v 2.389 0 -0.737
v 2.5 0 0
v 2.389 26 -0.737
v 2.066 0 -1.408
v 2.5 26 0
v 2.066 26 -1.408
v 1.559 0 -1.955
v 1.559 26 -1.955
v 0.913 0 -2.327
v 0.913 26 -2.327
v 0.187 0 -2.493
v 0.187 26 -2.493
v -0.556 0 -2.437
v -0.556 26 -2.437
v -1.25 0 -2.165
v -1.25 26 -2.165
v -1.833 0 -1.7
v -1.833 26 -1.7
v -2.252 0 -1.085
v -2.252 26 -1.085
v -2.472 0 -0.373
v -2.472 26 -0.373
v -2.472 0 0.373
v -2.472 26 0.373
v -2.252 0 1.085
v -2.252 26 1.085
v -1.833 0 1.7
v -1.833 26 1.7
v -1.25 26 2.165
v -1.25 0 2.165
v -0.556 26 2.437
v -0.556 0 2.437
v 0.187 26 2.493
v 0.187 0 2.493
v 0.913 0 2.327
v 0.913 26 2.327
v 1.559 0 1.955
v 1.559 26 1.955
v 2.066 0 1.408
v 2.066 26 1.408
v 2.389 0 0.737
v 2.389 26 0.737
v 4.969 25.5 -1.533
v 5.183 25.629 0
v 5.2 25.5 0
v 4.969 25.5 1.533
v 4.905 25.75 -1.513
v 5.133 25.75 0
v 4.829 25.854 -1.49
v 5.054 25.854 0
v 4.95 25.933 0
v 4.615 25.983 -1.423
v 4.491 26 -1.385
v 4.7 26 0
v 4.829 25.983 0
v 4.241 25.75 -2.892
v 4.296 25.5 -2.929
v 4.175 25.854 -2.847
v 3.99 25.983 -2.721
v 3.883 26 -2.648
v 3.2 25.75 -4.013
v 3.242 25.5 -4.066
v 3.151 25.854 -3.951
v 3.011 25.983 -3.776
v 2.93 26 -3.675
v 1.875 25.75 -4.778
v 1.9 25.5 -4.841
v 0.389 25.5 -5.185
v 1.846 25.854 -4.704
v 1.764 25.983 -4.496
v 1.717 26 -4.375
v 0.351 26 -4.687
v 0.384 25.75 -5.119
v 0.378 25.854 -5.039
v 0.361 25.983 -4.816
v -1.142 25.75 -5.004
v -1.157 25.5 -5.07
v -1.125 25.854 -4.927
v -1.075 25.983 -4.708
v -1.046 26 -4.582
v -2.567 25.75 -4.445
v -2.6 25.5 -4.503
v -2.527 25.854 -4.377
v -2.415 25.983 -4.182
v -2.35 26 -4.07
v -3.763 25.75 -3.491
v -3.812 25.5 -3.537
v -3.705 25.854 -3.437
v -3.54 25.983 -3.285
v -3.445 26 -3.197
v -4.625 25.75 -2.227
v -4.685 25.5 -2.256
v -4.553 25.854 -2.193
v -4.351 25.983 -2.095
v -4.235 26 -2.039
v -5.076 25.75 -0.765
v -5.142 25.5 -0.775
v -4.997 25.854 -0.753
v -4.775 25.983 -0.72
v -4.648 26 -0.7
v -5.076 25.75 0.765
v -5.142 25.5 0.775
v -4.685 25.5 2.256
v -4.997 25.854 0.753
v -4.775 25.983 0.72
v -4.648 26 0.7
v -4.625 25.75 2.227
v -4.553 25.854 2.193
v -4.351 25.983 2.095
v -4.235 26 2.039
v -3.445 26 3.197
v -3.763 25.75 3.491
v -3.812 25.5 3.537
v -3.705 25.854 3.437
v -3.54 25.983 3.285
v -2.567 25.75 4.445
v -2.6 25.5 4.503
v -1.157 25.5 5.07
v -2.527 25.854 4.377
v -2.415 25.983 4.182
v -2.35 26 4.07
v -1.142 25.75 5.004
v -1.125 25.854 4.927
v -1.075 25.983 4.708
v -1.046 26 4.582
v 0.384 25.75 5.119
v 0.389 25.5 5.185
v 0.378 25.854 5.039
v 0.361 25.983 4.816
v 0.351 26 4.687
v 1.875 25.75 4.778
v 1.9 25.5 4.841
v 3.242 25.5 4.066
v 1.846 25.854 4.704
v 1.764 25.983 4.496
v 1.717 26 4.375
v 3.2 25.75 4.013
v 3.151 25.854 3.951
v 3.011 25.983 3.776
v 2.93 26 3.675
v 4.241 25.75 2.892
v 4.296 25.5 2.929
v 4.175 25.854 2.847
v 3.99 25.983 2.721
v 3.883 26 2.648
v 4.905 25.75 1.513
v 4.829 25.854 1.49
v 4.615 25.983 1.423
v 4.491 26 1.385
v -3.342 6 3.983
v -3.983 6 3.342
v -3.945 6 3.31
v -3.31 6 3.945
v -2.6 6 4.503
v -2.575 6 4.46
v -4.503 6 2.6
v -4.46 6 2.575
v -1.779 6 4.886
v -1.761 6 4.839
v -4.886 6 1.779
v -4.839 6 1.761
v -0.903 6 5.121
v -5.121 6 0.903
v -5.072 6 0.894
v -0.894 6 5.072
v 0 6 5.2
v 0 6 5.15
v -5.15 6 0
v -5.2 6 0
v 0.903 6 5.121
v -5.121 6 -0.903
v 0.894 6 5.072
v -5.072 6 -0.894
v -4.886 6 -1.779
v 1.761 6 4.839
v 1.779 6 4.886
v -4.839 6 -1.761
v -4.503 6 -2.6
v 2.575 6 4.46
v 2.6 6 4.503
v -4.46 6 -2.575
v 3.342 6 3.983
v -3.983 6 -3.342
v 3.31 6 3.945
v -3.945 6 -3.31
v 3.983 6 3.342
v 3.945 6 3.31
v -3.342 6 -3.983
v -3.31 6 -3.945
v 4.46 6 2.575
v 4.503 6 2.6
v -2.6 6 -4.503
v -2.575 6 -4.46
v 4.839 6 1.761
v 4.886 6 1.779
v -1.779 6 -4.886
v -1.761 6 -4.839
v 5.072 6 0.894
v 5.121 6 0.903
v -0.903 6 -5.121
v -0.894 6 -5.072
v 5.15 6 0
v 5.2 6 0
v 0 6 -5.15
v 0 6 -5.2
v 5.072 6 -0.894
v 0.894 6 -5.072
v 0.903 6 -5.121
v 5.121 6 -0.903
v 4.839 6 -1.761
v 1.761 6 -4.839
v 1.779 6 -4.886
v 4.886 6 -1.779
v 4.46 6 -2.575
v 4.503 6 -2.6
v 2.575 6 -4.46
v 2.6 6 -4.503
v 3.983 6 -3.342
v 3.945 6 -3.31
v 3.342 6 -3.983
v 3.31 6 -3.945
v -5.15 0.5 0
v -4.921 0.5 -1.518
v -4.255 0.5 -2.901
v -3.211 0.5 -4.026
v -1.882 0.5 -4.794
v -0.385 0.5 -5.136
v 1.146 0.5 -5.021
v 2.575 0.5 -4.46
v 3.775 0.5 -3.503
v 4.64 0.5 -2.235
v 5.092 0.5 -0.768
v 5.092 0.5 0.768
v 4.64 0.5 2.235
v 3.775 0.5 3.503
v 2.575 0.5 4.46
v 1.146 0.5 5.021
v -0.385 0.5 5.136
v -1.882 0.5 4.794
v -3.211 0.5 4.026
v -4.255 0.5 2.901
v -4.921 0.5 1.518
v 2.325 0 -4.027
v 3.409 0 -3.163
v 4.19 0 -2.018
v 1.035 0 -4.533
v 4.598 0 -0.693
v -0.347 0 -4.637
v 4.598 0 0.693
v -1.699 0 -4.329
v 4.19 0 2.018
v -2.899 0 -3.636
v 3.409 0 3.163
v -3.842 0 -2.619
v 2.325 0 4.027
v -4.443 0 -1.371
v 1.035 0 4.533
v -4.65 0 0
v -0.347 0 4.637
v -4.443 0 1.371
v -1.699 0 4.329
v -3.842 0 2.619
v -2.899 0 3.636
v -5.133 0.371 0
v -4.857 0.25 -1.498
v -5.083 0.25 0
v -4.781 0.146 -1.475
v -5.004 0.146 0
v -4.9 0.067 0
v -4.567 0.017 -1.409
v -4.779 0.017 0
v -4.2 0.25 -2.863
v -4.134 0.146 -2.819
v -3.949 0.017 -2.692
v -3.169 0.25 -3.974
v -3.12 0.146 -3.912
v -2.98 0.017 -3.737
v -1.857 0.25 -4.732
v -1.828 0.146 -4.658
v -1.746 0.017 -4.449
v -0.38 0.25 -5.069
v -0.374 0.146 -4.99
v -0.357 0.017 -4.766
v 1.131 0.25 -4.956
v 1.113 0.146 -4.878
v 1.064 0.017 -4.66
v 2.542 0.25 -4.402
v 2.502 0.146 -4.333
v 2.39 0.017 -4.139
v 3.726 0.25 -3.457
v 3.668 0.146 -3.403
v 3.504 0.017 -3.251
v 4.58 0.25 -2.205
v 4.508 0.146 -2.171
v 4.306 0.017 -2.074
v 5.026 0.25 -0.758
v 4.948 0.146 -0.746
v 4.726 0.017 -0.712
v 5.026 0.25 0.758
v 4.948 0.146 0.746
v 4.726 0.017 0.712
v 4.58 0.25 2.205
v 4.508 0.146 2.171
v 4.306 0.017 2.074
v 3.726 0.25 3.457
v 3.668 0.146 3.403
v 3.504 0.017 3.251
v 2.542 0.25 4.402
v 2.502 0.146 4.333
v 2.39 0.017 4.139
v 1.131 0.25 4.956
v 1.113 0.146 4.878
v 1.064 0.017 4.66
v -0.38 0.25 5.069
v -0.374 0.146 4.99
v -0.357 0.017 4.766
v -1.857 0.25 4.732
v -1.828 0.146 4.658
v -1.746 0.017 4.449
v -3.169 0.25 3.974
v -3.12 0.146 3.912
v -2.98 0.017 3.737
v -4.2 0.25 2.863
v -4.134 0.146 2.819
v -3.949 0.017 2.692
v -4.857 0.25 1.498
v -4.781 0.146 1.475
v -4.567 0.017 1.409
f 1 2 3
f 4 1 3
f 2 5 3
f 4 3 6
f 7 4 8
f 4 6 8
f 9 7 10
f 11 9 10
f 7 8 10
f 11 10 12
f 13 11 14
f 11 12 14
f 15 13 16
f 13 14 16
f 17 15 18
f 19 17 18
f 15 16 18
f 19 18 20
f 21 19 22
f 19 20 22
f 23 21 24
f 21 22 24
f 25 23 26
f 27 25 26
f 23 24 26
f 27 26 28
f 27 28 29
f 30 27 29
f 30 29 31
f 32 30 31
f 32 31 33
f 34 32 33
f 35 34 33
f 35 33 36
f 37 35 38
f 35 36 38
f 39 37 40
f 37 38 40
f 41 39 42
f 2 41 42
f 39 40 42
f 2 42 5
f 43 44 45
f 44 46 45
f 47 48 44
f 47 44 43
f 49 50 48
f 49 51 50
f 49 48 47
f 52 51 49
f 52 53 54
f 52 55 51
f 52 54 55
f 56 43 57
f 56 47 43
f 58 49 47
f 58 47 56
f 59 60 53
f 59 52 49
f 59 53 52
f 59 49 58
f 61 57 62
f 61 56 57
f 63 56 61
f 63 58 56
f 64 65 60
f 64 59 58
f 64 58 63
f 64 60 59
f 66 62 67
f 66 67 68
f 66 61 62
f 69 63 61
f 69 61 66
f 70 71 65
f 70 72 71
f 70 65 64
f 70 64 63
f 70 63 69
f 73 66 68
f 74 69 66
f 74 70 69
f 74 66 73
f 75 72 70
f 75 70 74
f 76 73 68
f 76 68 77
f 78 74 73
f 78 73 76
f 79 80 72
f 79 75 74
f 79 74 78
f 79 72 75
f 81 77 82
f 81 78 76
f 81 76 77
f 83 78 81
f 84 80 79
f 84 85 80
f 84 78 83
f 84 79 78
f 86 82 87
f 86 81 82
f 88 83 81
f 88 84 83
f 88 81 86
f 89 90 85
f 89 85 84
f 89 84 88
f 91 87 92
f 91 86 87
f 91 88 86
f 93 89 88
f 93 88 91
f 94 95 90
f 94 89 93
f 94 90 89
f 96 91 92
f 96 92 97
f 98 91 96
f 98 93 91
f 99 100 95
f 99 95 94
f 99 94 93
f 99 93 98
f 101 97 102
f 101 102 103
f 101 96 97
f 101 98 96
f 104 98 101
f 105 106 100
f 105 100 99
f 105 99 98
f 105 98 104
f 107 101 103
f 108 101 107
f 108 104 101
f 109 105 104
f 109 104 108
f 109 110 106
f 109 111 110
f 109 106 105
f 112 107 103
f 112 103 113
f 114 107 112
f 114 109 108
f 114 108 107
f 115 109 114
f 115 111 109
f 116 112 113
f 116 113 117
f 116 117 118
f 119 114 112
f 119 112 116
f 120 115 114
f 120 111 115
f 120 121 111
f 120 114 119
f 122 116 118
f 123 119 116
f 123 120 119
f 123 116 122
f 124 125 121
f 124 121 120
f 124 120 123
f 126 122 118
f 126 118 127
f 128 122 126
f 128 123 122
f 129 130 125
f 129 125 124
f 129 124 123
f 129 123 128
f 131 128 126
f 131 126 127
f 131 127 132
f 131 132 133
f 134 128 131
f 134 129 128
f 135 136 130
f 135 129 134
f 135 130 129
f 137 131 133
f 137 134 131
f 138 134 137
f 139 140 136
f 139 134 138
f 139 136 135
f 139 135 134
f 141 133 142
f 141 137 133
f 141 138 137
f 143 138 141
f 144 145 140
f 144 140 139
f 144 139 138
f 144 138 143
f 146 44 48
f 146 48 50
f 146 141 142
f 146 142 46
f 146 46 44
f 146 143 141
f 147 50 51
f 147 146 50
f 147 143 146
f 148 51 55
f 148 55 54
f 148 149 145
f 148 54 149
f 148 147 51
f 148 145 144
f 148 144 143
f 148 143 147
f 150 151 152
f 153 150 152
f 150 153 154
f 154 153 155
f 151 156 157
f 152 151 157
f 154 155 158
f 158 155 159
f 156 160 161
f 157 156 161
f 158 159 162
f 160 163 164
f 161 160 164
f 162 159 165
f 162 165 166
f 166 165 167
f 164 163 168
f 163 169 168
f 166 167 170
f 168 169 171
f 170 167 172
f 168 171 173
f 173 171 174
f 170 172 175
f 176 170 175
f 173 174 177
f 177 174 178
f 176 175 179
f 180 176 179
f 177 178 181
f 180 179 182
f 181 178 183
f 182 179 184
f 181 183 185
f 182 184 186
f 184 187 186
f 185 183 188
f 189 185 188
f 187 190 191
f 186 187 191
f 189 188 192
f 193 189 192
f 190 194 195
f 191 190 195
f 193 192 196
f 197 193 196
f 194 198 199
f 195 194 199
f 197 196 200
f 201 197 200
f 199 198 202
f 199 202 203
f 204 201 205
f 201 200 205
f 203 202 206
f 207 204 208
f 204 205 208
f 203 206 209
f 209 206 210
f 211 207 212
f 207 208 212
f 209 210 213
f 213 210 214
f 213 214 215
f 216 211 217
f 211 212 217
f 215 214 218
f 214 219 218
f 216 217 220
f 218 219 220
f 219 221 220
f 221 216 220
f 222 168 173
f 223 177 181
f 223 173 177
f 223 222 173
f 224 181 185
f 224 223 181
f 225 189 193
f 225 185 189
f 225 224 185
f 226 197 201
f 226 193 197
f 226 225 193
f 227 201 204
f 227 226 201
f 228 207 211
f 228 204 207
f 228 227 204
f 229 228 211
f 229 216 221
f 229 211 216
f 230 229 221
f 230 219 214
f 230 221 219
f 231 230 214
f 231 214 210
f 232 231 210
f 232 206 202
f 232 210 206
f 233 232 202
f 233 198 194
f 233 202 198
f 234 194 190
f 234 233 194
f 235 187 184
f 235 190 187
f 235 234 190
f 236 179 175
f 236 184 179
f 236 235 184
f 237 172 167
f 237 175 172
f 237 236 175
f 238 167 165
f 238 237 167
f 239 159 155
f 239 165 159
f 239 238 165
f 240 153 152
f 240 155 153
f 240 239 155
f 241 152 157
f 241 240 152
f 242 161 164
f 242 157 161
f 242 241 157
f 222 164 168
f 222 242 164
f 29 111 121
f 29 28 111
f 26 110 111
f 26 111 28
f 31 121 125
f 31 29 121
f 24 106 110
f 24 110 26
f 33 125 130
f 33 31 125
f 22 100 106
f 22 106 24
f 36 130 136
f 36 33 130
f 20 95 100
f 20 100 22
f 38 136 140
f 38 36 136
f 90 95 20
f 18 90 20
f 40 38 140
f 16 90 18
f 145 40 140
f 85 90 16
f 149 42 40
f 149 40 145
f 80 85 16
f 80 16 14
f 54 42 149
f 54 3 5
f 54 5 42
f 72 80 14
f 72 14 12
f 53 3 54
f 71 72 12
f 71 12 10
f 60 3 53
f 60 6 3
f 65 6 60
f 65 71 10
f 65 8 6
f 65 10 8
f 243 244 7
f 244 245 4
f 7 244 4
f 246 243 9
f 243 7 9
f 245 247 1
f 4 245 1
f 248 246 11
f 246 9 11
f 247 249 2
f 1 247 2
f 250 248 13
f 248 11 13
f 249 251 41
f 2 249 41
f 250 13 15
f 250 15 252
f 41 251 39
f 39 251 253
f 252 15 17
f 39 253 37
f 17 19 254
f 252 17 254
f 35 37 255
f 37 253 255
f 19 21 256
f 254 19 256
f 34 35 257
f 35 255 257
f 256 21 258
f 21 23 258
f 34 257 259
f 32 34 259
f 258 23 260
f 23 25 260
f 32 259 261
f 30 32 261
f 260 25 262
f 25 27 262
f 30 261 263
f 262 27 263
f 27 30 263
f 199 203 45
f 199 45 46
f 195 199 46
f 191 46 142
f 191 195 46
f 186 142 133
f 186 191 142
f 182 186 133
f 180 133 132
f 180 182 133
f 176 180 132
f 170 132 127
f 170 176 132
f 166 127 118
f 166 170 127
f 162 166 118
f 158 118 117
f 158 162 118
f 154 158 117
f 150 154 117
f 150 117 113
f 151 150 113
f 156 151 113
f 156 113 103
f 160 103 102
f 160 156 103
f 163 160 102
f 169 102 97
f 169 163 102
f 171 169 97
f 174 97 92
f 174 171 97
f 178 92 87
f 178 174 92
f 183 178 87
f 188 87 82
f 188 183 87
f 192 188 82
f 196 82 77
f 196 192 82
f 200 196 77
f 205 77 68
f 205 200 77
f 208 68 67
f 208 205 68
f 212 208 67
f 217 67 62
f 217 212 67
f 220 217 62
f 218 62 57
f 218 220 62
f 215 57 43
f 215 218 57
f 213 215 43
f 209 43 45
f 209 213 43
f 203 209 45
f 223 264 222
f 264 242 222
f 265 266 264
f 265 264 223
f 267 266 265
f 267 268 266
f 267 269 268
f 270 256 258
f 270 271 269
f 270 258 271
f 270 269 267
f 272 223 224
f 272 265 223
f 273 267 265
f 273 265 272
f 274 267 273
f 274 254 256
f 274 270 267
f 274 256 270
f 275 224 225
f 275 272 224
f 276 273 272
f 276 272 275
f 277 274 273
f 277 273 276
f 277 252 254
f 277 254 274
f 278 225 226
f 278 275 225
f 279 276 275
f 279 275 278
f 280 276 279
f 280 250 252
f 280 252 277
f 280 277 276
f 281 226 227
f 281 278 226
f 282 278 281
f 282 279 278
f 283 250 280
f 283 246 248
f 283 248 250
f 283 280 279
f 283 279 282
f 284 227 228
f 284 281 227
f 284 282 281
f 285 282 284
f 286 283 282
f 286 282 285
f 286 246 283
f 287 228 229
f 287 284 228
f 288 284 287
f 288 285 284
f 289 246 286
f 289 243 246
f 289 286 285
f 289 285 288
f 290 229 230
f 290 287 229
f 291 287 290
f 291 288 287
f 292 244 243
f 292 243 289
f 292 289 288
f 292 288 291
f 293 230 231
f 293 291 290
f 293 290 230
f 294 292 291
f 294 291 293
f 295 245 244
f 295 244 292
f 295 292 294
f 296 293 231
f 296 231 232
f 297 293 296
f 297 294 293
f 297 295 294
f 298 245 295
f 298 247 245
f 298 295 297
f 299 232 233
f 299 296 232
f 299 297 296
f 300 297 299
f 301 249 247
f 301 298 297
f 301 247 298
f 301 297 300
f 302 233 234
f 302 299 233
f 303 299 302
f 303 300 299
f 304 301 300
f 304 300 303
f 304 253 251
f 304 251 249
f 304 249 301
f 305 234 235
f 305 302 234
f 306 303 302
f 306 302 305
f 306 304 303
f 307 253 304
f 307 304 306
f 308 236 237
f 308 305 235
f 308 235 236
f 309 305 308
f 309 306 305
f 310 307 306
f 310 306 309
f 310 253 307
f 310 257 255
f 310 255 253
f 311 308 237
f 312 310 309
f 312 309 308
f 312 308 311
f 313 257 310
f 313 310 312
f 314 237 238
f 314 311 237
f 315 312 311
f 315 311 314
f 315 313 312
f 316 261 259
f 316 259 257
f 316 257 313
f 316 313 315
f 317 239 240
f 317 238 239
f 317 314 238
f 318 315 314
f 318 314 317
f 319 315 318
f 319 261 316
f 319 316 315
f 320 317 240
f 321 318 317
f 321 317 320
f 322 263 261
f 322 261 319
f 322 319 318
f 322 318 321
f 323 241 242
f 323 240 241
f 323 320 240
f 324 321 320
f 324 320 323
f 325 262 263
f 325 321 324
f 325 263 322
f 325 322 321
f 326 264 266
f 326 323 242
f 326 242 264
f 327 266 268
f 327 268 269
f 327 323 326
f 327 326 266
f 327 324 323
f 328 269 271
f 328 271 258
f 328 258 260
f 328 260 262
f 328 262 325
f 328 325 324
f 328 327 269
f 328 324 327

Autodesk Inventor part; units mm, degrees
ref_plane "YZ Plane" through (0, 0, 0) normal (1, 0, 0) x (0, 1, 0)
ref_plane "XZ Plane" through (0, 0, 0) normal (0, 1, 0) x (-1, 0, 0)
ref_plane "XY Plane" through (0, 0, 0) normal (0, 0, 1) x (1, 0, 0)
sketch "Sketch1" plane through (0, 0, 0) normal (0, 1, 0) x (-1, 0, 0)
  circle A0 centre (0, 0) radius 5.15
  dimension "d0" = 10.3
extrude "Extrusion1" add sketch "Sketch1" along normal blind 6
sketch "Sketch2" plane through (0, 6, 0) normal (0, 1, 0) x (1, 0, 0)
  circle A0 centre (0, 0) radius 5.2
  dimension "d3" = 10.4
extrude "Extrusion2" add sketch "Sketch2" along normal blind 20
fillet "Fillet1" radius 0.5 2 edges at (-5.2, 26, 0) (5.15, 0, 0)
sketch "Sketch3" plane through (0, 26, 0) normal (0, 1, 0) x (1, 0, 0)
  circle A0 centre (0, 0) radius 2.5
  dimension "d7" = 5
extrude "Extrusion3" cut sketch "Sketch3" against normal blind 30
properties part number "Schnecke_26mm_5mm"
